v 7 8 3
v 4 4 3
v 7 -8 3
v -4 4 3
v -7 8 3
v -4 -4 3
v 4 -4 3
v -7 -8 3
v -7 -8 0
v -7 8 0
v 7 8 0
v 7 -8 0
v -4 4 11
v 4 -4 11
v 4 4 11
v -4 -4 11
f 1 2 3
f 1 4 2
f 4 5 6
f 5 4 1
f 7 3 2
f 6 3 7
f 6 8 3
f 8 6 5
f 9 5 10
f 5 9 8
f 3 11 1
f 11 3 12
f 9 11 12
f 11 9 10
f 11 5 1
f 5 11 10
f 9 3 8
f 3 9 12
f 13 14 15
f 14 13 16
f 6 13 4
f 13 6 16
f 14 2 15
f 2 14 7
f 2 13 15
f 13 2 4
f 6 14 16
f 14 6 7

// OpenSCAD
// Tensioner pressure pad: bridges the post's slot; its stub slides in the block. Print 2.
// Print orientation: plate on the bed.
include <params.scad>
include <lib.scad>

rotate([0, -90, 0]) tensioner_pad();
